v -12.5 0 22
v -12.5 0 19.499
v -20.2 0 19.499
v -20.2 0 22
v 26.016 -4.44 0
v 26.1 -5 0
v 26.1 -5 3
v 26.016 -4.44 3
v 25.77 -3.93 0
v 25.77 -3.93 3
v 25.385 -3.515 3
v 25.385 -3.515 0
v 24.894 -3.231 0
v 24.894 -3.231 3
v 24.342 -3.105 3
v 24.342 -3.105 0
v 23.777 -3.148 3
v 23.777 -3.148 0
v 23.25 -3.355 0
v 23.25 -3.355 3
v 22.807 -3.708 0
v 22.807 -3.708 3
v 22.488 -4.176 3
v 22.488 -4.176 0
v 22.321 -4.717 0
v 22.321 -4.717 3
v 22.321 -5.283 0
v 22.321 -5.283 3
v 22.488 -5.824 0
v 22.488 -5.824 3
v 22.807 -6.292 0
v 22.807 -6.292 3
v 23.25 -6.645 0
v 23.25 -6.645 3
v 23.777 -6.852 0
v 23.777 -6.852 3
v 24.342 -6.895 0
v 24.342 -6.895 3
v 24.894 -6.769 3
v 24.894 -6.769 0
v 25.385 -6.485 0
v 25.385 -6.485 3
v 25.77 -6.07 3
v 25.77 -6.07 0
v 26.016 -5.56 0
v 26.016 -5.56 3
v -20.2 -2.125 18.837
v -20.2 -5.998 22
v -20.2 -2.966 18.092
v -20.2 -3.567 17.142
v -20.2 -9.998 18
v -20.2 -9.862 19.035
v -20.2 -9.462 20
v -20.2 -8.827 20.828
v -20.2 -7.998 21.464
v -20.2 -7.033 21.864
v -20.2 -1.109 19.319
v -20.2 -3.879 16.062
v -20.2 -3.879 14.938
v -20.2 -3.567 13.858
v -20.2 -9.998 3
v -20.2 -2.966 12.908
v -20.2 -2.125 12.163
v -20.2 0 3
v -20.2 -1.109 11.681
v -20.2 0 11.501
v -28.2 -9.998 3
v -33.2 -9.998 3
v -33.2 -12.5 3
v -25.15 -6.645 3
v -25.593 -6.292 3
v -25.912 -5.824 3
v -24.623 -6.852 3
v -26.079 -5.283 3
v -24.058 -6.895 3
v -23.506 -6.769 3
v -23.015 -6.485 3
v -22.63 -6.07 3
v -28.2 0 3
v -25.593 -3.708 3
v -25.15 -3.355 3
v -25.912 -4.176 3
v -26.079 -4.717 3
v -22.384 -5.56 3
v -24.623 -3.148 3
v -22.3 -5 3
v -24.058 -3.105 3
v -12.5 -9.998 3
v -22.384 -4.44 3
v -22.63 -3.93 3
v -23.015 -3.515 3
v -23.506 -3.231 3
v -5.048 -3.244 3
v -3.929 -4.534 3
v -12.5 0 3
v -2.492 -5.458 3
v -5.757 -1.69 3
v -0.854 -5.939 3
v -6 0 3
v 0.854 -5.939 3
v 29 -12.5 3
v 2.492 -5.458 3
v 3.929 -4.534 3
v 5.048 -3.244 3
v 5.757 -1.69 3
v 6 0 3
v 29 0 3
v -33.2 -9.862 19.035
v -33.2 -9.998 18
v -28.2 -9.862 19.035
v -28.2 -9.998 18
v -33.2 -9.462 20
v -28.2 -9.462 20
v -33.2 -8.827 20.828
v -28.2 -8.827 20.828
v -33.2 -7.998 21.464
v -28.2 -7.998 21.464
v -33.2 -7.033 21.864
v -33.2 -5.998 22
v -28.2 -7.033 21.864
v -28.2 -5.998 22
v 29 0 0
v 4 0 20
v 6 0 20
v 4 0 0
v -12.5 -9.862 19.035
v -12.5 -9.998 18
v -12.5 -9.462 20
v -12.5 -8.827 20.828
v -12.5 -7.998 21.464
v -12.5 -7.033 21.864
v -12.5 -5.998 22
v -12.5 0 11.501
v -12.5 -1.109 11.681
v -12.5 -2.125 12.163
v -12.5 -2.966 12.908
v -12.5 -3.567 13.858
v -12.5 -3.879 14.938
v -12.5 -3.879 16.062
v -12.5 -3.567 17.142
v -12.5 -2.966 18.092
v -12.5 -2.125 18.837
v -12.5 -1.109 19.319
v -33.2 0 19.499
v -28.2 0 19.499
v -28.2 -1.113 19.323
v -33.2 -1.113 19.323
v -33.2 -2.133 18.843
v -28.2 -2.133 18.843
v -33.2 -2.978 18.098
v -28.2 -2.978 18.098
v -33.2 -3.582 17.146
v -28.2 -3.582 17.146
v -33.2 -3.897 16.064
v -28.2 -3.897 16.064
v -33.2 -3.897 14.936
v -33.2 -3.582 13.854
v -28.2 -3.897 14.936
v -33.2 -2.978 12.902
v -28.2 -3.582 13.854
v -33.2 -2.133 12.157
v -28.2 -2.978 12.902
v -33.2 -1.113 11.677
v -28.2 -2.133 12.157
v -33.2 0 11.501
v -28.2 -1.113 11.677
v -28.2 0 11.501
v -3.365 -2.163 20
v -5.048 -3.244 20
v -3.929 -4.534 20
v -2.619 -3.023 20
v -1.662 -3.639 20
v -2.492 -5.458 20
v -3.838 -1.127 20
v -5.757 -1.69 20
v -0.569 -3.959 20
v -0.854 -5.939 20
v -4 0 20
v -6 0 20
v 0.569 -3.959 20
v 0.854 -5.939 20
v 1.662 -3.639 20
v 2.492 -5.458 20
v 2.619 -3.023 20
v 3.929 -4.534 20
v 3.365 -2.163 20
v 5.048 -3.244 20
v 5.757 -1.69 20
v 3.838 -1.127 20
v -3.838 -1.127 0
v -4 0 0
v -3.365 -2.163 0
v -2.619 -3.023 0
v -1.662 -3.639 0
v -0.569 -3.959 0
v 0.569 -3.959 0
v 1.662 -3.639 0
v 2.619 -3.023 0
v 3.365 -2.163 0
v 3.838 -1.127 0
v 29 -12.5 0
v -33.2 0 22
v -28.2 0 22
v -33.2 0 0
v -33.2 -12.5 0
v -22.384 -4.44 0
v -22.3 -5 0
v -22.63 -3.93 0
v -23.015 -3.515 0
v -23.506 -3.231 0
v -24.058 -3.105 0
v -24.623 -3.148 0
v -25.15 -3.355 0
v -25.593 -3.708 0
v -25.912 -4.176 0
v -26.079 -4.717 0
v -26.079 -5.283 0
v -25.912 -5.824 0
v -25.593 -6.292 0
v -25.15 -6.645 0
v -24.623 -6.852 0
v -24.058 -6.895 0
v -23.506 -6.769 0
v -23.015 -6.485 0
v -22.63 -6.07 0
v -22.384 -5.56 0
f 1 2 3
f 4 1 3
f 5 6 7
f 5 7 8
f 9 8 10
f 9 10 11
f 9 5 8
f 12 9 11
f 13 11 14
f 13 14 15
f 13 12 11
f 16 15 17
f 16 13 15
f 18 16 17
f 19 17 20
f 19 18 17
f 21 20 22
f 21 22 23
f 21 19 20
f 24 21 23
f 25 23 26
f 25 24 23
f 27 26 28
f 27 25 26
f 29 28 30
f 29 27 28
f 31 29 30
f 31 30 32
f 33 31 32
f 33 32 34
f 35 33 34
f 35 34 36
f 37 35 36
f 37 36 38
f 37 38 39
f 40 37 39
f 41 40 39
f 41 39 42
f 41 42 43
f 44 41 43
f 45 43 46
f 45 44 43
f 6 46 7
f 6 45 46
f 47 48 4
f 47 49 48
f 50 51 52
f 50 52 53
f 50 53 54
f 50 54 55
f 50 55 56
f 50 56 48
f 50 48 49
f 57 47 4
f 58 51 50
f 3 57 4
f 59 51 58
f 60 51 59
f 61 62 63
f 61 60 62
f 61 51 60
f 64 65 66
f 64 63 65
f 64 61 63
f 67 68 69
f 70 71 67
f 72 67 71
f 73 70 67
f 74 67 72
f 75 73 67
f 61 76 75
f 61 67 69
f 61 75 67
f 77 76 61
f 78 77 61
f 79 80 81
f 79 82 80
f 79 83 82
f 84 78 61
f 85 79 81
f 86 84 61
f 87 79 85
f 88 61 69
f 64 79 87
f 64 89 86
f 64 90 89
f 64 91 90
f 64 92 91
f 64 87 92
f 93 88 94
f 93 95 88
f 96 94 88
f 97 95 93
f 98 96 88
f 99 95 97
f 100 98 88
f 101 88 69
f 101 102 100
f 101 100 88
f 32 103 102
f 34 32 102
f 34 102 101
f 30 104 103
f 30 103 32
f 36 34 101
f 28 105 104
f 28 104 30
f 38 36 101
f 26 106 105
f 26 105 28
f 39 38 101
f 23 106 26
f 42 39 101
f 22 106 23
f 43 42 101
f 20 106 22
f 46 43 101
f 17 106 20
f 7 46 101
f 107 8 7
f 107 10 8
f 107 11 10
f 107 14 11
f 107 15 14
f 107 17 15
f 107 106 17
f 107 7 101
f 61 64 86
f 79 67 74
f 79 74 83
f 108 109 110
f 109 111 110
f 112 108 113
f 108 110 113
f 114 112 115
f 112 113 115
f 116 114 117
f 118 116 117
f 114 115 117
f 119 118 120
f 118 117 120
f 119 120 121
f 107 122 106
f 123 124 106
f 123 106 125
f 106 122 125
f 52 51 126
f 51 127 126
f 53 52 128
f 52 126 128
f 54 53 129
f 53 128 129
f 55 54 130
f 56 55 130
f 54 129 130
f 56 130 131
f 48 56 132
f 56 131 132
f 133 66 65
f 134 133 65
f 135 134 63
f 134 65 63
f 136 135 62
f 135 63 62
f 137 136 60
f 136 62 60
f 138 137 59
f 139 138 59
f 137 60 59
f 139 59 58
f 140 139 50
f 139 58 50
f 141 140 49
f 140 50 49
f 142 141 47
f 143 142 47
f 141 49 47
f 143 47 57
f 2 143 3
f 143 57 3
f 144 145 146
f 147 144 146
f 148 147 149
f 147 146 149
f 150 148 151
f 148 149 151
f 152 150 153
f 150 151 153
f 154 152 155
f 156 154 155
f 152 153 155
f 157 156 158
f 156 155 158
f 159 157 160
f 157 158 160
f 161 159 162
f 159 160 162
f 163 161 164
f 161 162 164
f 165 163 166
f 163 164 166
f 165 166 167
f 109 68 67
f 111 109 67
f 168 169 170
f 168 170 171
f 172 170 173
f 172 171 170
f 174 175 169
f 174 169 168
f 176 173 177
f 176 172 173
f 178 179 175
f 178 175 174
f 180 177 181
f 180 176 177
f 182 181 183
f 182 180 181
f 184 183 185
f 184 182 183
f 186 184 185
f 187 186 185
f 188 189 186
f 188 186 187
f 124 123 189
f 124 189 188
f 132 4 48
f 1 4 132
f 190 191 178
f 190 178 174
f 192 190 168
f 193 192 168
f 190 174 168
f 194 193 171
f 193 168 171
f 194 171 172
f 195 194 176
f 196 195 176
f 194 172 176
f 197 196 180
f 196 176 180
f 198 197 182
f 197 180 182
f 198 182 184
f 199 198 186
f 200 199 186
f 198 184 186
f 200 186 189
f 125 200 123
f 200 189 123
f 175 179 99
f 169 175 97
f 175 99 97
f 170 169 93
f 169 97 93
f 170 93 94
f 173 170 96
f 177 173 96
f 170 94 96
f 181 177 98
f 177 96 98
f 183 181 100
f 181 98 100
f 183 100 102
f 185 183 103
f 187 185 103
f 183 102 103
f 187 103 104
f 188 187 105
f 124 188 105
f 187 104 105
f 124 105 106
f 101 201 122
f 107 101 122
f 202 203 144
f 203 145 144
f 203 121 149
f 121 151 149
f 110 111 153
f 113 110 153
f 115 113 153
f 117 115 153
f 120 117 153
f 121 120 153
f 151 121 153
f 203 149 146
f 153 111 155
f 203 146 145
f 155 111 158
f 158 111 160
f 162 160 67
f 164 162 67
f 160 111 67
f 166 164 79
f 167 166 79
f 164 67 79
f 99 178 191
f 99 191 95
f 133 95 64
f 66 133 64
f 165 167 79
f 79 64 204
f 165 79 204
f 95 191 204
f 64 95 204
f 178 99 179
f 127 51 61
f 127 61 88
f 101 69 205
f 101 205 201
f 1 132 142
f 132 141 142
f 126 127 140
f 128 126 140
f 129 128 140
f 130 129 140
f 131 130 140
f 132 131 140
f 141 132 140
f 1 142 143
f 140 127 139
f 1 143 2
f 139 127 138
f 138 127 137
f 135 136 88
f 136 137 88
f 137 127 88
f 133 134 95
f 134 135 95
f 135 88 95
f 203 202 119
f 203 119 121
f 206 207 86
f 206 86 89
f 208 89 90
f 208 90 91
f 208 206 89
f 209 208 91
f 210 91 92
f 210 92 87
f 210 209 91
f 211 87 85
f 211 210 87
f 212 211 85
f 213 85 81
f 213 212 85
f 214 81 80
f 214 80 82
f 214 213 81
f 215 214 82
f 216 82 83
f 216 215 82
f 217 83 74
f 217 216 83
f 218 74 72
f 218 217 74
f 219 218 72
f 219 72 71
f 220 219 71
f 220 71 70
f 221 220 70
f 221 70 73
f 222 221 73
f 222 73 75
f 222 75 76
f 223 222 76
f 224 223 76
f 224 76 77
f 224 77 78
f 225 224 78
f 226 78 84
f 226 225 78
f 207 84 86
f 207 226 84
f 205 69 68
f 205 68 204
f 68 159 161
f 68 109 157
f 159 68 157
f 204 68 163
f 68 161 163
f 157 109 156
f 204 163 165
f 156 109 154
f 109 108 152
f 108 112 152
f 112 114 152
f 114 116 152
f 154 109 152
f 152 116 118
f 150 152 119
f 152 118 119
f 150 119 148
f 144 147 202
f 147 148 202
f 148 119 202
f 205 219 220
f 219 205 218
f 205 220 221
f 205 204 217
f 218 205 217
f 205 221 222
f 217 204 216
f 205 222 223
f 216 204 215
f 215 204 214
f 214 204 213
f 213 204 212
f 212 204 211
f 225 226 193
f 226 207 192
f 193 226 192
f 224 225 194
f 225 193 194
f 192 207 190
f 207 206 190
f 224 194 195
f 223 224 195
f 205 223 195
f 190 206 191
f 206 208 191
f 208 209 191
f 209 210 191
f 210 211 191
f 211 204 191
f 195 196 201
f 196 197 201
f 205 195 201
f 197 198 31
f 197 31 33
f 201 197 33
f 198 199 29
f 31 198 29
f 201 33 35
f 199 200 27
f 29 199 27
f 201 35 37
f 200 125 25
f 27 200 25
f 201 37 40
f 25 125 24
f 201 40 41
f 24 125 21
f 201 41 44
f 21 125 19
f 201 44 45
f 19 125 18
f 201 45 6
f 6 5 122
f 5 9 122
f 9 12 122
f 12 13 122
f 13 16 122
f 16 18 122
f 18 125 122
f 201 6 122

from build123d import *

# Parameters (mm, degrees)
SKETCH1_W           = 58
SKETCH1_H           = 25
SKETCH1_R           = 1.9
BOSS_EXTRUDE1_DEPTH = 3
SKETCH2_R           = 6
BOSS_EXTRUDE2_DEPTH = 20
SKETCH3_R           = 4
CUT_EXTRUDE1_DEPTH  = 38.379807383
SKETCH4_W           = 7.7
SKETCH4_H           = 19.996282454
BOSS_EXTRUDE3_DEPTH = 19
CUT_EXTRUDE2_REACH  = 57.325
SKETCH5_R           = 4
FILLET1_R           = 4
SKETCH7_W           = 4.2
SKETCH7_H           = 25
BOSS_EXTRUDE4_DEPTH = 3
SKETCH8_W           = 5
SKETCH8_H           = 19.996282454
BOSS_EXTRUDE5_DEPTH = 19
CUT_EXTRUDE3_REACH  = 64.547
SKETCH9_R           = 4
FILLET2_R           = 4
SKETCH10_W          = 62.2
SKETCH10_H          = 12.5
CUT_EXTRUDE4_DEPTH  = 42.74314315


with BuildPart() as part:
    # Sketch1 → Boss-Extrude1 (new body)
    with BuildSketch(Plane.XY):
        Rectangle(SKETCH1_W, SKETCH1_H)
        with Locations((24.2, 5)):
            Circle(SKETCH1_R, mode=Mode.SUBTRACT)
        with Locations((24.2, -5)):
            Circle(SKETCH1_R, mode=Mode.SUBTRACT)
        with Locations((-24.2, 5)):
            Circle(SKETCH1_R, mode=Mode.SUBTRACT)
        with Locations((-24.2, -5)):
            Circle(SKETCH1_R, mode=Mode.SUBTRACT)
    extrude(amount=BOSS_EXTRUDE1_DEPTH)

    # Sketch2 → Boss-Extrude2 (add)
    with BuildSketch(Plane.XY):
        Circle(SKETCH2_R)
    extrude(amount=BOSS_EXTRUDE2_DEPTH)

    # Sketch3 → Cut-Extrude1 (cut, through all)
    with BuildSketch(Plane.XY.offset(20)):
        Circle(SKETCH3_R)
    extrude(amount=-CUT_EXTRUDE1_DEPTH, mode=Mode.SUBTRACT)

    # Sketch4 → Boss-Extrude3 (add)
    with BuildSketch(Plane.XY.offset(3)):
        with Locations((-16.35, 0)):
            Rectangle(SKETCH4_W, SKETCH4_H)
    extrude(amount=BOSS_EXTRUDE3_DEPTH)

    # Sketch5 → Cut-Extrude2 (cut, up to next)
    with BuildSketch(Plane.ZY.offset(20.2), mode=Mode.PRIVATE) as cut_extrude2_sk1:
        with Locations((15.5, 0.080826905)):
            Circle(SKETCH5_R)
    cut_extrude2_tool1 = extrude(cut_extrude2_sk1.sketch, amount=-CUT_EXTRUDE2_REACH, mode=Mode.PRIVATE) & part.part
    add(cut_extrude2_tool1.solids().sort_by_distance((-20.2, 0.080827, 15.5))[0], mode=Mode.SUBTRACT)

    # Fillet1
    fillet1_edges = [part.edges().sort_by_distance(p)[0] for p in [
        (-16.35, 9.998141227, 22),
        (-16.35, -9.998141227, 22),
    ]]
    fillet(fillet1_edges, radius=FILLET1_R)

    # Sketch7 → Boss-Extrude4 (add)
    with BuildSketch(Plane.XY.offset(3)):
        with Locations((-31.1, 0)):
            Rectangle(SKETCH7_W, SKETCH7_H)
    extrude(amount=-BOSS_EXTRUDE4_DEPTH)

    # Sketch8 → Boss-Extrude5 (add)
    with BuildSketch(Plane.XY.offset(3)):
        with Locations((-30.7, 0)):
            Rectangle(SKETCH8_W, SKETCH8_H)
    extrude(amount=BOSS_EXTRUDE5_DEPTH)

    # Sketch9 → Cut-Extrude3 (cut, up to next)
    with BuildSketch(Plane(origin=(-28.2, 0, 0), x_dir=(0, 0, -1), z_dir=(1, 0, 0)), mode=Mode.PRIVATE) as cut_extrude3_sk1:
        with Locations(Location((-15.5, 0.063578072, 0), (0, 0, 90))):
            Circle(SKETCH9_R)
    cut_extrude3_tool1 = extrude(cut_extrude3_sk1.sketch, amount=-CUT_EXTRUDE3_REACH, mode=Mode.PRIVATE) & part.part
    add(cut_extrude3_tool1.solids().sort_by_distance((-28.2, 0.063578, 15.5))[0], mode=Mode.SUBTRACT)

    # Fillet2
    fillet2_edges = [part.edges().sort_by_distance(p)[0] for p in [
        (-30.7, 9.998141227, 22),
        (-30.7, -9.998141227, 22),
    ]]
    fillet(fillet2_edges, radius=FILLET2_R)

    # Sketch10 → Cut-Extrude4 (cut, through all)
    with BuildSketch(Plane(origin=(0, 0, 0), x_dir=(-1, 0, 0), z_dir=(0, 0, -1))):
        with Locations((2.1, 6.25)):
            Rectangle(SKETCH10_W, SKETCH10_H)
    extrude(amount=-CUT_EXTRUDE4_DEPTH, mode=Mode.SUBTRACT)


solid = part.part
